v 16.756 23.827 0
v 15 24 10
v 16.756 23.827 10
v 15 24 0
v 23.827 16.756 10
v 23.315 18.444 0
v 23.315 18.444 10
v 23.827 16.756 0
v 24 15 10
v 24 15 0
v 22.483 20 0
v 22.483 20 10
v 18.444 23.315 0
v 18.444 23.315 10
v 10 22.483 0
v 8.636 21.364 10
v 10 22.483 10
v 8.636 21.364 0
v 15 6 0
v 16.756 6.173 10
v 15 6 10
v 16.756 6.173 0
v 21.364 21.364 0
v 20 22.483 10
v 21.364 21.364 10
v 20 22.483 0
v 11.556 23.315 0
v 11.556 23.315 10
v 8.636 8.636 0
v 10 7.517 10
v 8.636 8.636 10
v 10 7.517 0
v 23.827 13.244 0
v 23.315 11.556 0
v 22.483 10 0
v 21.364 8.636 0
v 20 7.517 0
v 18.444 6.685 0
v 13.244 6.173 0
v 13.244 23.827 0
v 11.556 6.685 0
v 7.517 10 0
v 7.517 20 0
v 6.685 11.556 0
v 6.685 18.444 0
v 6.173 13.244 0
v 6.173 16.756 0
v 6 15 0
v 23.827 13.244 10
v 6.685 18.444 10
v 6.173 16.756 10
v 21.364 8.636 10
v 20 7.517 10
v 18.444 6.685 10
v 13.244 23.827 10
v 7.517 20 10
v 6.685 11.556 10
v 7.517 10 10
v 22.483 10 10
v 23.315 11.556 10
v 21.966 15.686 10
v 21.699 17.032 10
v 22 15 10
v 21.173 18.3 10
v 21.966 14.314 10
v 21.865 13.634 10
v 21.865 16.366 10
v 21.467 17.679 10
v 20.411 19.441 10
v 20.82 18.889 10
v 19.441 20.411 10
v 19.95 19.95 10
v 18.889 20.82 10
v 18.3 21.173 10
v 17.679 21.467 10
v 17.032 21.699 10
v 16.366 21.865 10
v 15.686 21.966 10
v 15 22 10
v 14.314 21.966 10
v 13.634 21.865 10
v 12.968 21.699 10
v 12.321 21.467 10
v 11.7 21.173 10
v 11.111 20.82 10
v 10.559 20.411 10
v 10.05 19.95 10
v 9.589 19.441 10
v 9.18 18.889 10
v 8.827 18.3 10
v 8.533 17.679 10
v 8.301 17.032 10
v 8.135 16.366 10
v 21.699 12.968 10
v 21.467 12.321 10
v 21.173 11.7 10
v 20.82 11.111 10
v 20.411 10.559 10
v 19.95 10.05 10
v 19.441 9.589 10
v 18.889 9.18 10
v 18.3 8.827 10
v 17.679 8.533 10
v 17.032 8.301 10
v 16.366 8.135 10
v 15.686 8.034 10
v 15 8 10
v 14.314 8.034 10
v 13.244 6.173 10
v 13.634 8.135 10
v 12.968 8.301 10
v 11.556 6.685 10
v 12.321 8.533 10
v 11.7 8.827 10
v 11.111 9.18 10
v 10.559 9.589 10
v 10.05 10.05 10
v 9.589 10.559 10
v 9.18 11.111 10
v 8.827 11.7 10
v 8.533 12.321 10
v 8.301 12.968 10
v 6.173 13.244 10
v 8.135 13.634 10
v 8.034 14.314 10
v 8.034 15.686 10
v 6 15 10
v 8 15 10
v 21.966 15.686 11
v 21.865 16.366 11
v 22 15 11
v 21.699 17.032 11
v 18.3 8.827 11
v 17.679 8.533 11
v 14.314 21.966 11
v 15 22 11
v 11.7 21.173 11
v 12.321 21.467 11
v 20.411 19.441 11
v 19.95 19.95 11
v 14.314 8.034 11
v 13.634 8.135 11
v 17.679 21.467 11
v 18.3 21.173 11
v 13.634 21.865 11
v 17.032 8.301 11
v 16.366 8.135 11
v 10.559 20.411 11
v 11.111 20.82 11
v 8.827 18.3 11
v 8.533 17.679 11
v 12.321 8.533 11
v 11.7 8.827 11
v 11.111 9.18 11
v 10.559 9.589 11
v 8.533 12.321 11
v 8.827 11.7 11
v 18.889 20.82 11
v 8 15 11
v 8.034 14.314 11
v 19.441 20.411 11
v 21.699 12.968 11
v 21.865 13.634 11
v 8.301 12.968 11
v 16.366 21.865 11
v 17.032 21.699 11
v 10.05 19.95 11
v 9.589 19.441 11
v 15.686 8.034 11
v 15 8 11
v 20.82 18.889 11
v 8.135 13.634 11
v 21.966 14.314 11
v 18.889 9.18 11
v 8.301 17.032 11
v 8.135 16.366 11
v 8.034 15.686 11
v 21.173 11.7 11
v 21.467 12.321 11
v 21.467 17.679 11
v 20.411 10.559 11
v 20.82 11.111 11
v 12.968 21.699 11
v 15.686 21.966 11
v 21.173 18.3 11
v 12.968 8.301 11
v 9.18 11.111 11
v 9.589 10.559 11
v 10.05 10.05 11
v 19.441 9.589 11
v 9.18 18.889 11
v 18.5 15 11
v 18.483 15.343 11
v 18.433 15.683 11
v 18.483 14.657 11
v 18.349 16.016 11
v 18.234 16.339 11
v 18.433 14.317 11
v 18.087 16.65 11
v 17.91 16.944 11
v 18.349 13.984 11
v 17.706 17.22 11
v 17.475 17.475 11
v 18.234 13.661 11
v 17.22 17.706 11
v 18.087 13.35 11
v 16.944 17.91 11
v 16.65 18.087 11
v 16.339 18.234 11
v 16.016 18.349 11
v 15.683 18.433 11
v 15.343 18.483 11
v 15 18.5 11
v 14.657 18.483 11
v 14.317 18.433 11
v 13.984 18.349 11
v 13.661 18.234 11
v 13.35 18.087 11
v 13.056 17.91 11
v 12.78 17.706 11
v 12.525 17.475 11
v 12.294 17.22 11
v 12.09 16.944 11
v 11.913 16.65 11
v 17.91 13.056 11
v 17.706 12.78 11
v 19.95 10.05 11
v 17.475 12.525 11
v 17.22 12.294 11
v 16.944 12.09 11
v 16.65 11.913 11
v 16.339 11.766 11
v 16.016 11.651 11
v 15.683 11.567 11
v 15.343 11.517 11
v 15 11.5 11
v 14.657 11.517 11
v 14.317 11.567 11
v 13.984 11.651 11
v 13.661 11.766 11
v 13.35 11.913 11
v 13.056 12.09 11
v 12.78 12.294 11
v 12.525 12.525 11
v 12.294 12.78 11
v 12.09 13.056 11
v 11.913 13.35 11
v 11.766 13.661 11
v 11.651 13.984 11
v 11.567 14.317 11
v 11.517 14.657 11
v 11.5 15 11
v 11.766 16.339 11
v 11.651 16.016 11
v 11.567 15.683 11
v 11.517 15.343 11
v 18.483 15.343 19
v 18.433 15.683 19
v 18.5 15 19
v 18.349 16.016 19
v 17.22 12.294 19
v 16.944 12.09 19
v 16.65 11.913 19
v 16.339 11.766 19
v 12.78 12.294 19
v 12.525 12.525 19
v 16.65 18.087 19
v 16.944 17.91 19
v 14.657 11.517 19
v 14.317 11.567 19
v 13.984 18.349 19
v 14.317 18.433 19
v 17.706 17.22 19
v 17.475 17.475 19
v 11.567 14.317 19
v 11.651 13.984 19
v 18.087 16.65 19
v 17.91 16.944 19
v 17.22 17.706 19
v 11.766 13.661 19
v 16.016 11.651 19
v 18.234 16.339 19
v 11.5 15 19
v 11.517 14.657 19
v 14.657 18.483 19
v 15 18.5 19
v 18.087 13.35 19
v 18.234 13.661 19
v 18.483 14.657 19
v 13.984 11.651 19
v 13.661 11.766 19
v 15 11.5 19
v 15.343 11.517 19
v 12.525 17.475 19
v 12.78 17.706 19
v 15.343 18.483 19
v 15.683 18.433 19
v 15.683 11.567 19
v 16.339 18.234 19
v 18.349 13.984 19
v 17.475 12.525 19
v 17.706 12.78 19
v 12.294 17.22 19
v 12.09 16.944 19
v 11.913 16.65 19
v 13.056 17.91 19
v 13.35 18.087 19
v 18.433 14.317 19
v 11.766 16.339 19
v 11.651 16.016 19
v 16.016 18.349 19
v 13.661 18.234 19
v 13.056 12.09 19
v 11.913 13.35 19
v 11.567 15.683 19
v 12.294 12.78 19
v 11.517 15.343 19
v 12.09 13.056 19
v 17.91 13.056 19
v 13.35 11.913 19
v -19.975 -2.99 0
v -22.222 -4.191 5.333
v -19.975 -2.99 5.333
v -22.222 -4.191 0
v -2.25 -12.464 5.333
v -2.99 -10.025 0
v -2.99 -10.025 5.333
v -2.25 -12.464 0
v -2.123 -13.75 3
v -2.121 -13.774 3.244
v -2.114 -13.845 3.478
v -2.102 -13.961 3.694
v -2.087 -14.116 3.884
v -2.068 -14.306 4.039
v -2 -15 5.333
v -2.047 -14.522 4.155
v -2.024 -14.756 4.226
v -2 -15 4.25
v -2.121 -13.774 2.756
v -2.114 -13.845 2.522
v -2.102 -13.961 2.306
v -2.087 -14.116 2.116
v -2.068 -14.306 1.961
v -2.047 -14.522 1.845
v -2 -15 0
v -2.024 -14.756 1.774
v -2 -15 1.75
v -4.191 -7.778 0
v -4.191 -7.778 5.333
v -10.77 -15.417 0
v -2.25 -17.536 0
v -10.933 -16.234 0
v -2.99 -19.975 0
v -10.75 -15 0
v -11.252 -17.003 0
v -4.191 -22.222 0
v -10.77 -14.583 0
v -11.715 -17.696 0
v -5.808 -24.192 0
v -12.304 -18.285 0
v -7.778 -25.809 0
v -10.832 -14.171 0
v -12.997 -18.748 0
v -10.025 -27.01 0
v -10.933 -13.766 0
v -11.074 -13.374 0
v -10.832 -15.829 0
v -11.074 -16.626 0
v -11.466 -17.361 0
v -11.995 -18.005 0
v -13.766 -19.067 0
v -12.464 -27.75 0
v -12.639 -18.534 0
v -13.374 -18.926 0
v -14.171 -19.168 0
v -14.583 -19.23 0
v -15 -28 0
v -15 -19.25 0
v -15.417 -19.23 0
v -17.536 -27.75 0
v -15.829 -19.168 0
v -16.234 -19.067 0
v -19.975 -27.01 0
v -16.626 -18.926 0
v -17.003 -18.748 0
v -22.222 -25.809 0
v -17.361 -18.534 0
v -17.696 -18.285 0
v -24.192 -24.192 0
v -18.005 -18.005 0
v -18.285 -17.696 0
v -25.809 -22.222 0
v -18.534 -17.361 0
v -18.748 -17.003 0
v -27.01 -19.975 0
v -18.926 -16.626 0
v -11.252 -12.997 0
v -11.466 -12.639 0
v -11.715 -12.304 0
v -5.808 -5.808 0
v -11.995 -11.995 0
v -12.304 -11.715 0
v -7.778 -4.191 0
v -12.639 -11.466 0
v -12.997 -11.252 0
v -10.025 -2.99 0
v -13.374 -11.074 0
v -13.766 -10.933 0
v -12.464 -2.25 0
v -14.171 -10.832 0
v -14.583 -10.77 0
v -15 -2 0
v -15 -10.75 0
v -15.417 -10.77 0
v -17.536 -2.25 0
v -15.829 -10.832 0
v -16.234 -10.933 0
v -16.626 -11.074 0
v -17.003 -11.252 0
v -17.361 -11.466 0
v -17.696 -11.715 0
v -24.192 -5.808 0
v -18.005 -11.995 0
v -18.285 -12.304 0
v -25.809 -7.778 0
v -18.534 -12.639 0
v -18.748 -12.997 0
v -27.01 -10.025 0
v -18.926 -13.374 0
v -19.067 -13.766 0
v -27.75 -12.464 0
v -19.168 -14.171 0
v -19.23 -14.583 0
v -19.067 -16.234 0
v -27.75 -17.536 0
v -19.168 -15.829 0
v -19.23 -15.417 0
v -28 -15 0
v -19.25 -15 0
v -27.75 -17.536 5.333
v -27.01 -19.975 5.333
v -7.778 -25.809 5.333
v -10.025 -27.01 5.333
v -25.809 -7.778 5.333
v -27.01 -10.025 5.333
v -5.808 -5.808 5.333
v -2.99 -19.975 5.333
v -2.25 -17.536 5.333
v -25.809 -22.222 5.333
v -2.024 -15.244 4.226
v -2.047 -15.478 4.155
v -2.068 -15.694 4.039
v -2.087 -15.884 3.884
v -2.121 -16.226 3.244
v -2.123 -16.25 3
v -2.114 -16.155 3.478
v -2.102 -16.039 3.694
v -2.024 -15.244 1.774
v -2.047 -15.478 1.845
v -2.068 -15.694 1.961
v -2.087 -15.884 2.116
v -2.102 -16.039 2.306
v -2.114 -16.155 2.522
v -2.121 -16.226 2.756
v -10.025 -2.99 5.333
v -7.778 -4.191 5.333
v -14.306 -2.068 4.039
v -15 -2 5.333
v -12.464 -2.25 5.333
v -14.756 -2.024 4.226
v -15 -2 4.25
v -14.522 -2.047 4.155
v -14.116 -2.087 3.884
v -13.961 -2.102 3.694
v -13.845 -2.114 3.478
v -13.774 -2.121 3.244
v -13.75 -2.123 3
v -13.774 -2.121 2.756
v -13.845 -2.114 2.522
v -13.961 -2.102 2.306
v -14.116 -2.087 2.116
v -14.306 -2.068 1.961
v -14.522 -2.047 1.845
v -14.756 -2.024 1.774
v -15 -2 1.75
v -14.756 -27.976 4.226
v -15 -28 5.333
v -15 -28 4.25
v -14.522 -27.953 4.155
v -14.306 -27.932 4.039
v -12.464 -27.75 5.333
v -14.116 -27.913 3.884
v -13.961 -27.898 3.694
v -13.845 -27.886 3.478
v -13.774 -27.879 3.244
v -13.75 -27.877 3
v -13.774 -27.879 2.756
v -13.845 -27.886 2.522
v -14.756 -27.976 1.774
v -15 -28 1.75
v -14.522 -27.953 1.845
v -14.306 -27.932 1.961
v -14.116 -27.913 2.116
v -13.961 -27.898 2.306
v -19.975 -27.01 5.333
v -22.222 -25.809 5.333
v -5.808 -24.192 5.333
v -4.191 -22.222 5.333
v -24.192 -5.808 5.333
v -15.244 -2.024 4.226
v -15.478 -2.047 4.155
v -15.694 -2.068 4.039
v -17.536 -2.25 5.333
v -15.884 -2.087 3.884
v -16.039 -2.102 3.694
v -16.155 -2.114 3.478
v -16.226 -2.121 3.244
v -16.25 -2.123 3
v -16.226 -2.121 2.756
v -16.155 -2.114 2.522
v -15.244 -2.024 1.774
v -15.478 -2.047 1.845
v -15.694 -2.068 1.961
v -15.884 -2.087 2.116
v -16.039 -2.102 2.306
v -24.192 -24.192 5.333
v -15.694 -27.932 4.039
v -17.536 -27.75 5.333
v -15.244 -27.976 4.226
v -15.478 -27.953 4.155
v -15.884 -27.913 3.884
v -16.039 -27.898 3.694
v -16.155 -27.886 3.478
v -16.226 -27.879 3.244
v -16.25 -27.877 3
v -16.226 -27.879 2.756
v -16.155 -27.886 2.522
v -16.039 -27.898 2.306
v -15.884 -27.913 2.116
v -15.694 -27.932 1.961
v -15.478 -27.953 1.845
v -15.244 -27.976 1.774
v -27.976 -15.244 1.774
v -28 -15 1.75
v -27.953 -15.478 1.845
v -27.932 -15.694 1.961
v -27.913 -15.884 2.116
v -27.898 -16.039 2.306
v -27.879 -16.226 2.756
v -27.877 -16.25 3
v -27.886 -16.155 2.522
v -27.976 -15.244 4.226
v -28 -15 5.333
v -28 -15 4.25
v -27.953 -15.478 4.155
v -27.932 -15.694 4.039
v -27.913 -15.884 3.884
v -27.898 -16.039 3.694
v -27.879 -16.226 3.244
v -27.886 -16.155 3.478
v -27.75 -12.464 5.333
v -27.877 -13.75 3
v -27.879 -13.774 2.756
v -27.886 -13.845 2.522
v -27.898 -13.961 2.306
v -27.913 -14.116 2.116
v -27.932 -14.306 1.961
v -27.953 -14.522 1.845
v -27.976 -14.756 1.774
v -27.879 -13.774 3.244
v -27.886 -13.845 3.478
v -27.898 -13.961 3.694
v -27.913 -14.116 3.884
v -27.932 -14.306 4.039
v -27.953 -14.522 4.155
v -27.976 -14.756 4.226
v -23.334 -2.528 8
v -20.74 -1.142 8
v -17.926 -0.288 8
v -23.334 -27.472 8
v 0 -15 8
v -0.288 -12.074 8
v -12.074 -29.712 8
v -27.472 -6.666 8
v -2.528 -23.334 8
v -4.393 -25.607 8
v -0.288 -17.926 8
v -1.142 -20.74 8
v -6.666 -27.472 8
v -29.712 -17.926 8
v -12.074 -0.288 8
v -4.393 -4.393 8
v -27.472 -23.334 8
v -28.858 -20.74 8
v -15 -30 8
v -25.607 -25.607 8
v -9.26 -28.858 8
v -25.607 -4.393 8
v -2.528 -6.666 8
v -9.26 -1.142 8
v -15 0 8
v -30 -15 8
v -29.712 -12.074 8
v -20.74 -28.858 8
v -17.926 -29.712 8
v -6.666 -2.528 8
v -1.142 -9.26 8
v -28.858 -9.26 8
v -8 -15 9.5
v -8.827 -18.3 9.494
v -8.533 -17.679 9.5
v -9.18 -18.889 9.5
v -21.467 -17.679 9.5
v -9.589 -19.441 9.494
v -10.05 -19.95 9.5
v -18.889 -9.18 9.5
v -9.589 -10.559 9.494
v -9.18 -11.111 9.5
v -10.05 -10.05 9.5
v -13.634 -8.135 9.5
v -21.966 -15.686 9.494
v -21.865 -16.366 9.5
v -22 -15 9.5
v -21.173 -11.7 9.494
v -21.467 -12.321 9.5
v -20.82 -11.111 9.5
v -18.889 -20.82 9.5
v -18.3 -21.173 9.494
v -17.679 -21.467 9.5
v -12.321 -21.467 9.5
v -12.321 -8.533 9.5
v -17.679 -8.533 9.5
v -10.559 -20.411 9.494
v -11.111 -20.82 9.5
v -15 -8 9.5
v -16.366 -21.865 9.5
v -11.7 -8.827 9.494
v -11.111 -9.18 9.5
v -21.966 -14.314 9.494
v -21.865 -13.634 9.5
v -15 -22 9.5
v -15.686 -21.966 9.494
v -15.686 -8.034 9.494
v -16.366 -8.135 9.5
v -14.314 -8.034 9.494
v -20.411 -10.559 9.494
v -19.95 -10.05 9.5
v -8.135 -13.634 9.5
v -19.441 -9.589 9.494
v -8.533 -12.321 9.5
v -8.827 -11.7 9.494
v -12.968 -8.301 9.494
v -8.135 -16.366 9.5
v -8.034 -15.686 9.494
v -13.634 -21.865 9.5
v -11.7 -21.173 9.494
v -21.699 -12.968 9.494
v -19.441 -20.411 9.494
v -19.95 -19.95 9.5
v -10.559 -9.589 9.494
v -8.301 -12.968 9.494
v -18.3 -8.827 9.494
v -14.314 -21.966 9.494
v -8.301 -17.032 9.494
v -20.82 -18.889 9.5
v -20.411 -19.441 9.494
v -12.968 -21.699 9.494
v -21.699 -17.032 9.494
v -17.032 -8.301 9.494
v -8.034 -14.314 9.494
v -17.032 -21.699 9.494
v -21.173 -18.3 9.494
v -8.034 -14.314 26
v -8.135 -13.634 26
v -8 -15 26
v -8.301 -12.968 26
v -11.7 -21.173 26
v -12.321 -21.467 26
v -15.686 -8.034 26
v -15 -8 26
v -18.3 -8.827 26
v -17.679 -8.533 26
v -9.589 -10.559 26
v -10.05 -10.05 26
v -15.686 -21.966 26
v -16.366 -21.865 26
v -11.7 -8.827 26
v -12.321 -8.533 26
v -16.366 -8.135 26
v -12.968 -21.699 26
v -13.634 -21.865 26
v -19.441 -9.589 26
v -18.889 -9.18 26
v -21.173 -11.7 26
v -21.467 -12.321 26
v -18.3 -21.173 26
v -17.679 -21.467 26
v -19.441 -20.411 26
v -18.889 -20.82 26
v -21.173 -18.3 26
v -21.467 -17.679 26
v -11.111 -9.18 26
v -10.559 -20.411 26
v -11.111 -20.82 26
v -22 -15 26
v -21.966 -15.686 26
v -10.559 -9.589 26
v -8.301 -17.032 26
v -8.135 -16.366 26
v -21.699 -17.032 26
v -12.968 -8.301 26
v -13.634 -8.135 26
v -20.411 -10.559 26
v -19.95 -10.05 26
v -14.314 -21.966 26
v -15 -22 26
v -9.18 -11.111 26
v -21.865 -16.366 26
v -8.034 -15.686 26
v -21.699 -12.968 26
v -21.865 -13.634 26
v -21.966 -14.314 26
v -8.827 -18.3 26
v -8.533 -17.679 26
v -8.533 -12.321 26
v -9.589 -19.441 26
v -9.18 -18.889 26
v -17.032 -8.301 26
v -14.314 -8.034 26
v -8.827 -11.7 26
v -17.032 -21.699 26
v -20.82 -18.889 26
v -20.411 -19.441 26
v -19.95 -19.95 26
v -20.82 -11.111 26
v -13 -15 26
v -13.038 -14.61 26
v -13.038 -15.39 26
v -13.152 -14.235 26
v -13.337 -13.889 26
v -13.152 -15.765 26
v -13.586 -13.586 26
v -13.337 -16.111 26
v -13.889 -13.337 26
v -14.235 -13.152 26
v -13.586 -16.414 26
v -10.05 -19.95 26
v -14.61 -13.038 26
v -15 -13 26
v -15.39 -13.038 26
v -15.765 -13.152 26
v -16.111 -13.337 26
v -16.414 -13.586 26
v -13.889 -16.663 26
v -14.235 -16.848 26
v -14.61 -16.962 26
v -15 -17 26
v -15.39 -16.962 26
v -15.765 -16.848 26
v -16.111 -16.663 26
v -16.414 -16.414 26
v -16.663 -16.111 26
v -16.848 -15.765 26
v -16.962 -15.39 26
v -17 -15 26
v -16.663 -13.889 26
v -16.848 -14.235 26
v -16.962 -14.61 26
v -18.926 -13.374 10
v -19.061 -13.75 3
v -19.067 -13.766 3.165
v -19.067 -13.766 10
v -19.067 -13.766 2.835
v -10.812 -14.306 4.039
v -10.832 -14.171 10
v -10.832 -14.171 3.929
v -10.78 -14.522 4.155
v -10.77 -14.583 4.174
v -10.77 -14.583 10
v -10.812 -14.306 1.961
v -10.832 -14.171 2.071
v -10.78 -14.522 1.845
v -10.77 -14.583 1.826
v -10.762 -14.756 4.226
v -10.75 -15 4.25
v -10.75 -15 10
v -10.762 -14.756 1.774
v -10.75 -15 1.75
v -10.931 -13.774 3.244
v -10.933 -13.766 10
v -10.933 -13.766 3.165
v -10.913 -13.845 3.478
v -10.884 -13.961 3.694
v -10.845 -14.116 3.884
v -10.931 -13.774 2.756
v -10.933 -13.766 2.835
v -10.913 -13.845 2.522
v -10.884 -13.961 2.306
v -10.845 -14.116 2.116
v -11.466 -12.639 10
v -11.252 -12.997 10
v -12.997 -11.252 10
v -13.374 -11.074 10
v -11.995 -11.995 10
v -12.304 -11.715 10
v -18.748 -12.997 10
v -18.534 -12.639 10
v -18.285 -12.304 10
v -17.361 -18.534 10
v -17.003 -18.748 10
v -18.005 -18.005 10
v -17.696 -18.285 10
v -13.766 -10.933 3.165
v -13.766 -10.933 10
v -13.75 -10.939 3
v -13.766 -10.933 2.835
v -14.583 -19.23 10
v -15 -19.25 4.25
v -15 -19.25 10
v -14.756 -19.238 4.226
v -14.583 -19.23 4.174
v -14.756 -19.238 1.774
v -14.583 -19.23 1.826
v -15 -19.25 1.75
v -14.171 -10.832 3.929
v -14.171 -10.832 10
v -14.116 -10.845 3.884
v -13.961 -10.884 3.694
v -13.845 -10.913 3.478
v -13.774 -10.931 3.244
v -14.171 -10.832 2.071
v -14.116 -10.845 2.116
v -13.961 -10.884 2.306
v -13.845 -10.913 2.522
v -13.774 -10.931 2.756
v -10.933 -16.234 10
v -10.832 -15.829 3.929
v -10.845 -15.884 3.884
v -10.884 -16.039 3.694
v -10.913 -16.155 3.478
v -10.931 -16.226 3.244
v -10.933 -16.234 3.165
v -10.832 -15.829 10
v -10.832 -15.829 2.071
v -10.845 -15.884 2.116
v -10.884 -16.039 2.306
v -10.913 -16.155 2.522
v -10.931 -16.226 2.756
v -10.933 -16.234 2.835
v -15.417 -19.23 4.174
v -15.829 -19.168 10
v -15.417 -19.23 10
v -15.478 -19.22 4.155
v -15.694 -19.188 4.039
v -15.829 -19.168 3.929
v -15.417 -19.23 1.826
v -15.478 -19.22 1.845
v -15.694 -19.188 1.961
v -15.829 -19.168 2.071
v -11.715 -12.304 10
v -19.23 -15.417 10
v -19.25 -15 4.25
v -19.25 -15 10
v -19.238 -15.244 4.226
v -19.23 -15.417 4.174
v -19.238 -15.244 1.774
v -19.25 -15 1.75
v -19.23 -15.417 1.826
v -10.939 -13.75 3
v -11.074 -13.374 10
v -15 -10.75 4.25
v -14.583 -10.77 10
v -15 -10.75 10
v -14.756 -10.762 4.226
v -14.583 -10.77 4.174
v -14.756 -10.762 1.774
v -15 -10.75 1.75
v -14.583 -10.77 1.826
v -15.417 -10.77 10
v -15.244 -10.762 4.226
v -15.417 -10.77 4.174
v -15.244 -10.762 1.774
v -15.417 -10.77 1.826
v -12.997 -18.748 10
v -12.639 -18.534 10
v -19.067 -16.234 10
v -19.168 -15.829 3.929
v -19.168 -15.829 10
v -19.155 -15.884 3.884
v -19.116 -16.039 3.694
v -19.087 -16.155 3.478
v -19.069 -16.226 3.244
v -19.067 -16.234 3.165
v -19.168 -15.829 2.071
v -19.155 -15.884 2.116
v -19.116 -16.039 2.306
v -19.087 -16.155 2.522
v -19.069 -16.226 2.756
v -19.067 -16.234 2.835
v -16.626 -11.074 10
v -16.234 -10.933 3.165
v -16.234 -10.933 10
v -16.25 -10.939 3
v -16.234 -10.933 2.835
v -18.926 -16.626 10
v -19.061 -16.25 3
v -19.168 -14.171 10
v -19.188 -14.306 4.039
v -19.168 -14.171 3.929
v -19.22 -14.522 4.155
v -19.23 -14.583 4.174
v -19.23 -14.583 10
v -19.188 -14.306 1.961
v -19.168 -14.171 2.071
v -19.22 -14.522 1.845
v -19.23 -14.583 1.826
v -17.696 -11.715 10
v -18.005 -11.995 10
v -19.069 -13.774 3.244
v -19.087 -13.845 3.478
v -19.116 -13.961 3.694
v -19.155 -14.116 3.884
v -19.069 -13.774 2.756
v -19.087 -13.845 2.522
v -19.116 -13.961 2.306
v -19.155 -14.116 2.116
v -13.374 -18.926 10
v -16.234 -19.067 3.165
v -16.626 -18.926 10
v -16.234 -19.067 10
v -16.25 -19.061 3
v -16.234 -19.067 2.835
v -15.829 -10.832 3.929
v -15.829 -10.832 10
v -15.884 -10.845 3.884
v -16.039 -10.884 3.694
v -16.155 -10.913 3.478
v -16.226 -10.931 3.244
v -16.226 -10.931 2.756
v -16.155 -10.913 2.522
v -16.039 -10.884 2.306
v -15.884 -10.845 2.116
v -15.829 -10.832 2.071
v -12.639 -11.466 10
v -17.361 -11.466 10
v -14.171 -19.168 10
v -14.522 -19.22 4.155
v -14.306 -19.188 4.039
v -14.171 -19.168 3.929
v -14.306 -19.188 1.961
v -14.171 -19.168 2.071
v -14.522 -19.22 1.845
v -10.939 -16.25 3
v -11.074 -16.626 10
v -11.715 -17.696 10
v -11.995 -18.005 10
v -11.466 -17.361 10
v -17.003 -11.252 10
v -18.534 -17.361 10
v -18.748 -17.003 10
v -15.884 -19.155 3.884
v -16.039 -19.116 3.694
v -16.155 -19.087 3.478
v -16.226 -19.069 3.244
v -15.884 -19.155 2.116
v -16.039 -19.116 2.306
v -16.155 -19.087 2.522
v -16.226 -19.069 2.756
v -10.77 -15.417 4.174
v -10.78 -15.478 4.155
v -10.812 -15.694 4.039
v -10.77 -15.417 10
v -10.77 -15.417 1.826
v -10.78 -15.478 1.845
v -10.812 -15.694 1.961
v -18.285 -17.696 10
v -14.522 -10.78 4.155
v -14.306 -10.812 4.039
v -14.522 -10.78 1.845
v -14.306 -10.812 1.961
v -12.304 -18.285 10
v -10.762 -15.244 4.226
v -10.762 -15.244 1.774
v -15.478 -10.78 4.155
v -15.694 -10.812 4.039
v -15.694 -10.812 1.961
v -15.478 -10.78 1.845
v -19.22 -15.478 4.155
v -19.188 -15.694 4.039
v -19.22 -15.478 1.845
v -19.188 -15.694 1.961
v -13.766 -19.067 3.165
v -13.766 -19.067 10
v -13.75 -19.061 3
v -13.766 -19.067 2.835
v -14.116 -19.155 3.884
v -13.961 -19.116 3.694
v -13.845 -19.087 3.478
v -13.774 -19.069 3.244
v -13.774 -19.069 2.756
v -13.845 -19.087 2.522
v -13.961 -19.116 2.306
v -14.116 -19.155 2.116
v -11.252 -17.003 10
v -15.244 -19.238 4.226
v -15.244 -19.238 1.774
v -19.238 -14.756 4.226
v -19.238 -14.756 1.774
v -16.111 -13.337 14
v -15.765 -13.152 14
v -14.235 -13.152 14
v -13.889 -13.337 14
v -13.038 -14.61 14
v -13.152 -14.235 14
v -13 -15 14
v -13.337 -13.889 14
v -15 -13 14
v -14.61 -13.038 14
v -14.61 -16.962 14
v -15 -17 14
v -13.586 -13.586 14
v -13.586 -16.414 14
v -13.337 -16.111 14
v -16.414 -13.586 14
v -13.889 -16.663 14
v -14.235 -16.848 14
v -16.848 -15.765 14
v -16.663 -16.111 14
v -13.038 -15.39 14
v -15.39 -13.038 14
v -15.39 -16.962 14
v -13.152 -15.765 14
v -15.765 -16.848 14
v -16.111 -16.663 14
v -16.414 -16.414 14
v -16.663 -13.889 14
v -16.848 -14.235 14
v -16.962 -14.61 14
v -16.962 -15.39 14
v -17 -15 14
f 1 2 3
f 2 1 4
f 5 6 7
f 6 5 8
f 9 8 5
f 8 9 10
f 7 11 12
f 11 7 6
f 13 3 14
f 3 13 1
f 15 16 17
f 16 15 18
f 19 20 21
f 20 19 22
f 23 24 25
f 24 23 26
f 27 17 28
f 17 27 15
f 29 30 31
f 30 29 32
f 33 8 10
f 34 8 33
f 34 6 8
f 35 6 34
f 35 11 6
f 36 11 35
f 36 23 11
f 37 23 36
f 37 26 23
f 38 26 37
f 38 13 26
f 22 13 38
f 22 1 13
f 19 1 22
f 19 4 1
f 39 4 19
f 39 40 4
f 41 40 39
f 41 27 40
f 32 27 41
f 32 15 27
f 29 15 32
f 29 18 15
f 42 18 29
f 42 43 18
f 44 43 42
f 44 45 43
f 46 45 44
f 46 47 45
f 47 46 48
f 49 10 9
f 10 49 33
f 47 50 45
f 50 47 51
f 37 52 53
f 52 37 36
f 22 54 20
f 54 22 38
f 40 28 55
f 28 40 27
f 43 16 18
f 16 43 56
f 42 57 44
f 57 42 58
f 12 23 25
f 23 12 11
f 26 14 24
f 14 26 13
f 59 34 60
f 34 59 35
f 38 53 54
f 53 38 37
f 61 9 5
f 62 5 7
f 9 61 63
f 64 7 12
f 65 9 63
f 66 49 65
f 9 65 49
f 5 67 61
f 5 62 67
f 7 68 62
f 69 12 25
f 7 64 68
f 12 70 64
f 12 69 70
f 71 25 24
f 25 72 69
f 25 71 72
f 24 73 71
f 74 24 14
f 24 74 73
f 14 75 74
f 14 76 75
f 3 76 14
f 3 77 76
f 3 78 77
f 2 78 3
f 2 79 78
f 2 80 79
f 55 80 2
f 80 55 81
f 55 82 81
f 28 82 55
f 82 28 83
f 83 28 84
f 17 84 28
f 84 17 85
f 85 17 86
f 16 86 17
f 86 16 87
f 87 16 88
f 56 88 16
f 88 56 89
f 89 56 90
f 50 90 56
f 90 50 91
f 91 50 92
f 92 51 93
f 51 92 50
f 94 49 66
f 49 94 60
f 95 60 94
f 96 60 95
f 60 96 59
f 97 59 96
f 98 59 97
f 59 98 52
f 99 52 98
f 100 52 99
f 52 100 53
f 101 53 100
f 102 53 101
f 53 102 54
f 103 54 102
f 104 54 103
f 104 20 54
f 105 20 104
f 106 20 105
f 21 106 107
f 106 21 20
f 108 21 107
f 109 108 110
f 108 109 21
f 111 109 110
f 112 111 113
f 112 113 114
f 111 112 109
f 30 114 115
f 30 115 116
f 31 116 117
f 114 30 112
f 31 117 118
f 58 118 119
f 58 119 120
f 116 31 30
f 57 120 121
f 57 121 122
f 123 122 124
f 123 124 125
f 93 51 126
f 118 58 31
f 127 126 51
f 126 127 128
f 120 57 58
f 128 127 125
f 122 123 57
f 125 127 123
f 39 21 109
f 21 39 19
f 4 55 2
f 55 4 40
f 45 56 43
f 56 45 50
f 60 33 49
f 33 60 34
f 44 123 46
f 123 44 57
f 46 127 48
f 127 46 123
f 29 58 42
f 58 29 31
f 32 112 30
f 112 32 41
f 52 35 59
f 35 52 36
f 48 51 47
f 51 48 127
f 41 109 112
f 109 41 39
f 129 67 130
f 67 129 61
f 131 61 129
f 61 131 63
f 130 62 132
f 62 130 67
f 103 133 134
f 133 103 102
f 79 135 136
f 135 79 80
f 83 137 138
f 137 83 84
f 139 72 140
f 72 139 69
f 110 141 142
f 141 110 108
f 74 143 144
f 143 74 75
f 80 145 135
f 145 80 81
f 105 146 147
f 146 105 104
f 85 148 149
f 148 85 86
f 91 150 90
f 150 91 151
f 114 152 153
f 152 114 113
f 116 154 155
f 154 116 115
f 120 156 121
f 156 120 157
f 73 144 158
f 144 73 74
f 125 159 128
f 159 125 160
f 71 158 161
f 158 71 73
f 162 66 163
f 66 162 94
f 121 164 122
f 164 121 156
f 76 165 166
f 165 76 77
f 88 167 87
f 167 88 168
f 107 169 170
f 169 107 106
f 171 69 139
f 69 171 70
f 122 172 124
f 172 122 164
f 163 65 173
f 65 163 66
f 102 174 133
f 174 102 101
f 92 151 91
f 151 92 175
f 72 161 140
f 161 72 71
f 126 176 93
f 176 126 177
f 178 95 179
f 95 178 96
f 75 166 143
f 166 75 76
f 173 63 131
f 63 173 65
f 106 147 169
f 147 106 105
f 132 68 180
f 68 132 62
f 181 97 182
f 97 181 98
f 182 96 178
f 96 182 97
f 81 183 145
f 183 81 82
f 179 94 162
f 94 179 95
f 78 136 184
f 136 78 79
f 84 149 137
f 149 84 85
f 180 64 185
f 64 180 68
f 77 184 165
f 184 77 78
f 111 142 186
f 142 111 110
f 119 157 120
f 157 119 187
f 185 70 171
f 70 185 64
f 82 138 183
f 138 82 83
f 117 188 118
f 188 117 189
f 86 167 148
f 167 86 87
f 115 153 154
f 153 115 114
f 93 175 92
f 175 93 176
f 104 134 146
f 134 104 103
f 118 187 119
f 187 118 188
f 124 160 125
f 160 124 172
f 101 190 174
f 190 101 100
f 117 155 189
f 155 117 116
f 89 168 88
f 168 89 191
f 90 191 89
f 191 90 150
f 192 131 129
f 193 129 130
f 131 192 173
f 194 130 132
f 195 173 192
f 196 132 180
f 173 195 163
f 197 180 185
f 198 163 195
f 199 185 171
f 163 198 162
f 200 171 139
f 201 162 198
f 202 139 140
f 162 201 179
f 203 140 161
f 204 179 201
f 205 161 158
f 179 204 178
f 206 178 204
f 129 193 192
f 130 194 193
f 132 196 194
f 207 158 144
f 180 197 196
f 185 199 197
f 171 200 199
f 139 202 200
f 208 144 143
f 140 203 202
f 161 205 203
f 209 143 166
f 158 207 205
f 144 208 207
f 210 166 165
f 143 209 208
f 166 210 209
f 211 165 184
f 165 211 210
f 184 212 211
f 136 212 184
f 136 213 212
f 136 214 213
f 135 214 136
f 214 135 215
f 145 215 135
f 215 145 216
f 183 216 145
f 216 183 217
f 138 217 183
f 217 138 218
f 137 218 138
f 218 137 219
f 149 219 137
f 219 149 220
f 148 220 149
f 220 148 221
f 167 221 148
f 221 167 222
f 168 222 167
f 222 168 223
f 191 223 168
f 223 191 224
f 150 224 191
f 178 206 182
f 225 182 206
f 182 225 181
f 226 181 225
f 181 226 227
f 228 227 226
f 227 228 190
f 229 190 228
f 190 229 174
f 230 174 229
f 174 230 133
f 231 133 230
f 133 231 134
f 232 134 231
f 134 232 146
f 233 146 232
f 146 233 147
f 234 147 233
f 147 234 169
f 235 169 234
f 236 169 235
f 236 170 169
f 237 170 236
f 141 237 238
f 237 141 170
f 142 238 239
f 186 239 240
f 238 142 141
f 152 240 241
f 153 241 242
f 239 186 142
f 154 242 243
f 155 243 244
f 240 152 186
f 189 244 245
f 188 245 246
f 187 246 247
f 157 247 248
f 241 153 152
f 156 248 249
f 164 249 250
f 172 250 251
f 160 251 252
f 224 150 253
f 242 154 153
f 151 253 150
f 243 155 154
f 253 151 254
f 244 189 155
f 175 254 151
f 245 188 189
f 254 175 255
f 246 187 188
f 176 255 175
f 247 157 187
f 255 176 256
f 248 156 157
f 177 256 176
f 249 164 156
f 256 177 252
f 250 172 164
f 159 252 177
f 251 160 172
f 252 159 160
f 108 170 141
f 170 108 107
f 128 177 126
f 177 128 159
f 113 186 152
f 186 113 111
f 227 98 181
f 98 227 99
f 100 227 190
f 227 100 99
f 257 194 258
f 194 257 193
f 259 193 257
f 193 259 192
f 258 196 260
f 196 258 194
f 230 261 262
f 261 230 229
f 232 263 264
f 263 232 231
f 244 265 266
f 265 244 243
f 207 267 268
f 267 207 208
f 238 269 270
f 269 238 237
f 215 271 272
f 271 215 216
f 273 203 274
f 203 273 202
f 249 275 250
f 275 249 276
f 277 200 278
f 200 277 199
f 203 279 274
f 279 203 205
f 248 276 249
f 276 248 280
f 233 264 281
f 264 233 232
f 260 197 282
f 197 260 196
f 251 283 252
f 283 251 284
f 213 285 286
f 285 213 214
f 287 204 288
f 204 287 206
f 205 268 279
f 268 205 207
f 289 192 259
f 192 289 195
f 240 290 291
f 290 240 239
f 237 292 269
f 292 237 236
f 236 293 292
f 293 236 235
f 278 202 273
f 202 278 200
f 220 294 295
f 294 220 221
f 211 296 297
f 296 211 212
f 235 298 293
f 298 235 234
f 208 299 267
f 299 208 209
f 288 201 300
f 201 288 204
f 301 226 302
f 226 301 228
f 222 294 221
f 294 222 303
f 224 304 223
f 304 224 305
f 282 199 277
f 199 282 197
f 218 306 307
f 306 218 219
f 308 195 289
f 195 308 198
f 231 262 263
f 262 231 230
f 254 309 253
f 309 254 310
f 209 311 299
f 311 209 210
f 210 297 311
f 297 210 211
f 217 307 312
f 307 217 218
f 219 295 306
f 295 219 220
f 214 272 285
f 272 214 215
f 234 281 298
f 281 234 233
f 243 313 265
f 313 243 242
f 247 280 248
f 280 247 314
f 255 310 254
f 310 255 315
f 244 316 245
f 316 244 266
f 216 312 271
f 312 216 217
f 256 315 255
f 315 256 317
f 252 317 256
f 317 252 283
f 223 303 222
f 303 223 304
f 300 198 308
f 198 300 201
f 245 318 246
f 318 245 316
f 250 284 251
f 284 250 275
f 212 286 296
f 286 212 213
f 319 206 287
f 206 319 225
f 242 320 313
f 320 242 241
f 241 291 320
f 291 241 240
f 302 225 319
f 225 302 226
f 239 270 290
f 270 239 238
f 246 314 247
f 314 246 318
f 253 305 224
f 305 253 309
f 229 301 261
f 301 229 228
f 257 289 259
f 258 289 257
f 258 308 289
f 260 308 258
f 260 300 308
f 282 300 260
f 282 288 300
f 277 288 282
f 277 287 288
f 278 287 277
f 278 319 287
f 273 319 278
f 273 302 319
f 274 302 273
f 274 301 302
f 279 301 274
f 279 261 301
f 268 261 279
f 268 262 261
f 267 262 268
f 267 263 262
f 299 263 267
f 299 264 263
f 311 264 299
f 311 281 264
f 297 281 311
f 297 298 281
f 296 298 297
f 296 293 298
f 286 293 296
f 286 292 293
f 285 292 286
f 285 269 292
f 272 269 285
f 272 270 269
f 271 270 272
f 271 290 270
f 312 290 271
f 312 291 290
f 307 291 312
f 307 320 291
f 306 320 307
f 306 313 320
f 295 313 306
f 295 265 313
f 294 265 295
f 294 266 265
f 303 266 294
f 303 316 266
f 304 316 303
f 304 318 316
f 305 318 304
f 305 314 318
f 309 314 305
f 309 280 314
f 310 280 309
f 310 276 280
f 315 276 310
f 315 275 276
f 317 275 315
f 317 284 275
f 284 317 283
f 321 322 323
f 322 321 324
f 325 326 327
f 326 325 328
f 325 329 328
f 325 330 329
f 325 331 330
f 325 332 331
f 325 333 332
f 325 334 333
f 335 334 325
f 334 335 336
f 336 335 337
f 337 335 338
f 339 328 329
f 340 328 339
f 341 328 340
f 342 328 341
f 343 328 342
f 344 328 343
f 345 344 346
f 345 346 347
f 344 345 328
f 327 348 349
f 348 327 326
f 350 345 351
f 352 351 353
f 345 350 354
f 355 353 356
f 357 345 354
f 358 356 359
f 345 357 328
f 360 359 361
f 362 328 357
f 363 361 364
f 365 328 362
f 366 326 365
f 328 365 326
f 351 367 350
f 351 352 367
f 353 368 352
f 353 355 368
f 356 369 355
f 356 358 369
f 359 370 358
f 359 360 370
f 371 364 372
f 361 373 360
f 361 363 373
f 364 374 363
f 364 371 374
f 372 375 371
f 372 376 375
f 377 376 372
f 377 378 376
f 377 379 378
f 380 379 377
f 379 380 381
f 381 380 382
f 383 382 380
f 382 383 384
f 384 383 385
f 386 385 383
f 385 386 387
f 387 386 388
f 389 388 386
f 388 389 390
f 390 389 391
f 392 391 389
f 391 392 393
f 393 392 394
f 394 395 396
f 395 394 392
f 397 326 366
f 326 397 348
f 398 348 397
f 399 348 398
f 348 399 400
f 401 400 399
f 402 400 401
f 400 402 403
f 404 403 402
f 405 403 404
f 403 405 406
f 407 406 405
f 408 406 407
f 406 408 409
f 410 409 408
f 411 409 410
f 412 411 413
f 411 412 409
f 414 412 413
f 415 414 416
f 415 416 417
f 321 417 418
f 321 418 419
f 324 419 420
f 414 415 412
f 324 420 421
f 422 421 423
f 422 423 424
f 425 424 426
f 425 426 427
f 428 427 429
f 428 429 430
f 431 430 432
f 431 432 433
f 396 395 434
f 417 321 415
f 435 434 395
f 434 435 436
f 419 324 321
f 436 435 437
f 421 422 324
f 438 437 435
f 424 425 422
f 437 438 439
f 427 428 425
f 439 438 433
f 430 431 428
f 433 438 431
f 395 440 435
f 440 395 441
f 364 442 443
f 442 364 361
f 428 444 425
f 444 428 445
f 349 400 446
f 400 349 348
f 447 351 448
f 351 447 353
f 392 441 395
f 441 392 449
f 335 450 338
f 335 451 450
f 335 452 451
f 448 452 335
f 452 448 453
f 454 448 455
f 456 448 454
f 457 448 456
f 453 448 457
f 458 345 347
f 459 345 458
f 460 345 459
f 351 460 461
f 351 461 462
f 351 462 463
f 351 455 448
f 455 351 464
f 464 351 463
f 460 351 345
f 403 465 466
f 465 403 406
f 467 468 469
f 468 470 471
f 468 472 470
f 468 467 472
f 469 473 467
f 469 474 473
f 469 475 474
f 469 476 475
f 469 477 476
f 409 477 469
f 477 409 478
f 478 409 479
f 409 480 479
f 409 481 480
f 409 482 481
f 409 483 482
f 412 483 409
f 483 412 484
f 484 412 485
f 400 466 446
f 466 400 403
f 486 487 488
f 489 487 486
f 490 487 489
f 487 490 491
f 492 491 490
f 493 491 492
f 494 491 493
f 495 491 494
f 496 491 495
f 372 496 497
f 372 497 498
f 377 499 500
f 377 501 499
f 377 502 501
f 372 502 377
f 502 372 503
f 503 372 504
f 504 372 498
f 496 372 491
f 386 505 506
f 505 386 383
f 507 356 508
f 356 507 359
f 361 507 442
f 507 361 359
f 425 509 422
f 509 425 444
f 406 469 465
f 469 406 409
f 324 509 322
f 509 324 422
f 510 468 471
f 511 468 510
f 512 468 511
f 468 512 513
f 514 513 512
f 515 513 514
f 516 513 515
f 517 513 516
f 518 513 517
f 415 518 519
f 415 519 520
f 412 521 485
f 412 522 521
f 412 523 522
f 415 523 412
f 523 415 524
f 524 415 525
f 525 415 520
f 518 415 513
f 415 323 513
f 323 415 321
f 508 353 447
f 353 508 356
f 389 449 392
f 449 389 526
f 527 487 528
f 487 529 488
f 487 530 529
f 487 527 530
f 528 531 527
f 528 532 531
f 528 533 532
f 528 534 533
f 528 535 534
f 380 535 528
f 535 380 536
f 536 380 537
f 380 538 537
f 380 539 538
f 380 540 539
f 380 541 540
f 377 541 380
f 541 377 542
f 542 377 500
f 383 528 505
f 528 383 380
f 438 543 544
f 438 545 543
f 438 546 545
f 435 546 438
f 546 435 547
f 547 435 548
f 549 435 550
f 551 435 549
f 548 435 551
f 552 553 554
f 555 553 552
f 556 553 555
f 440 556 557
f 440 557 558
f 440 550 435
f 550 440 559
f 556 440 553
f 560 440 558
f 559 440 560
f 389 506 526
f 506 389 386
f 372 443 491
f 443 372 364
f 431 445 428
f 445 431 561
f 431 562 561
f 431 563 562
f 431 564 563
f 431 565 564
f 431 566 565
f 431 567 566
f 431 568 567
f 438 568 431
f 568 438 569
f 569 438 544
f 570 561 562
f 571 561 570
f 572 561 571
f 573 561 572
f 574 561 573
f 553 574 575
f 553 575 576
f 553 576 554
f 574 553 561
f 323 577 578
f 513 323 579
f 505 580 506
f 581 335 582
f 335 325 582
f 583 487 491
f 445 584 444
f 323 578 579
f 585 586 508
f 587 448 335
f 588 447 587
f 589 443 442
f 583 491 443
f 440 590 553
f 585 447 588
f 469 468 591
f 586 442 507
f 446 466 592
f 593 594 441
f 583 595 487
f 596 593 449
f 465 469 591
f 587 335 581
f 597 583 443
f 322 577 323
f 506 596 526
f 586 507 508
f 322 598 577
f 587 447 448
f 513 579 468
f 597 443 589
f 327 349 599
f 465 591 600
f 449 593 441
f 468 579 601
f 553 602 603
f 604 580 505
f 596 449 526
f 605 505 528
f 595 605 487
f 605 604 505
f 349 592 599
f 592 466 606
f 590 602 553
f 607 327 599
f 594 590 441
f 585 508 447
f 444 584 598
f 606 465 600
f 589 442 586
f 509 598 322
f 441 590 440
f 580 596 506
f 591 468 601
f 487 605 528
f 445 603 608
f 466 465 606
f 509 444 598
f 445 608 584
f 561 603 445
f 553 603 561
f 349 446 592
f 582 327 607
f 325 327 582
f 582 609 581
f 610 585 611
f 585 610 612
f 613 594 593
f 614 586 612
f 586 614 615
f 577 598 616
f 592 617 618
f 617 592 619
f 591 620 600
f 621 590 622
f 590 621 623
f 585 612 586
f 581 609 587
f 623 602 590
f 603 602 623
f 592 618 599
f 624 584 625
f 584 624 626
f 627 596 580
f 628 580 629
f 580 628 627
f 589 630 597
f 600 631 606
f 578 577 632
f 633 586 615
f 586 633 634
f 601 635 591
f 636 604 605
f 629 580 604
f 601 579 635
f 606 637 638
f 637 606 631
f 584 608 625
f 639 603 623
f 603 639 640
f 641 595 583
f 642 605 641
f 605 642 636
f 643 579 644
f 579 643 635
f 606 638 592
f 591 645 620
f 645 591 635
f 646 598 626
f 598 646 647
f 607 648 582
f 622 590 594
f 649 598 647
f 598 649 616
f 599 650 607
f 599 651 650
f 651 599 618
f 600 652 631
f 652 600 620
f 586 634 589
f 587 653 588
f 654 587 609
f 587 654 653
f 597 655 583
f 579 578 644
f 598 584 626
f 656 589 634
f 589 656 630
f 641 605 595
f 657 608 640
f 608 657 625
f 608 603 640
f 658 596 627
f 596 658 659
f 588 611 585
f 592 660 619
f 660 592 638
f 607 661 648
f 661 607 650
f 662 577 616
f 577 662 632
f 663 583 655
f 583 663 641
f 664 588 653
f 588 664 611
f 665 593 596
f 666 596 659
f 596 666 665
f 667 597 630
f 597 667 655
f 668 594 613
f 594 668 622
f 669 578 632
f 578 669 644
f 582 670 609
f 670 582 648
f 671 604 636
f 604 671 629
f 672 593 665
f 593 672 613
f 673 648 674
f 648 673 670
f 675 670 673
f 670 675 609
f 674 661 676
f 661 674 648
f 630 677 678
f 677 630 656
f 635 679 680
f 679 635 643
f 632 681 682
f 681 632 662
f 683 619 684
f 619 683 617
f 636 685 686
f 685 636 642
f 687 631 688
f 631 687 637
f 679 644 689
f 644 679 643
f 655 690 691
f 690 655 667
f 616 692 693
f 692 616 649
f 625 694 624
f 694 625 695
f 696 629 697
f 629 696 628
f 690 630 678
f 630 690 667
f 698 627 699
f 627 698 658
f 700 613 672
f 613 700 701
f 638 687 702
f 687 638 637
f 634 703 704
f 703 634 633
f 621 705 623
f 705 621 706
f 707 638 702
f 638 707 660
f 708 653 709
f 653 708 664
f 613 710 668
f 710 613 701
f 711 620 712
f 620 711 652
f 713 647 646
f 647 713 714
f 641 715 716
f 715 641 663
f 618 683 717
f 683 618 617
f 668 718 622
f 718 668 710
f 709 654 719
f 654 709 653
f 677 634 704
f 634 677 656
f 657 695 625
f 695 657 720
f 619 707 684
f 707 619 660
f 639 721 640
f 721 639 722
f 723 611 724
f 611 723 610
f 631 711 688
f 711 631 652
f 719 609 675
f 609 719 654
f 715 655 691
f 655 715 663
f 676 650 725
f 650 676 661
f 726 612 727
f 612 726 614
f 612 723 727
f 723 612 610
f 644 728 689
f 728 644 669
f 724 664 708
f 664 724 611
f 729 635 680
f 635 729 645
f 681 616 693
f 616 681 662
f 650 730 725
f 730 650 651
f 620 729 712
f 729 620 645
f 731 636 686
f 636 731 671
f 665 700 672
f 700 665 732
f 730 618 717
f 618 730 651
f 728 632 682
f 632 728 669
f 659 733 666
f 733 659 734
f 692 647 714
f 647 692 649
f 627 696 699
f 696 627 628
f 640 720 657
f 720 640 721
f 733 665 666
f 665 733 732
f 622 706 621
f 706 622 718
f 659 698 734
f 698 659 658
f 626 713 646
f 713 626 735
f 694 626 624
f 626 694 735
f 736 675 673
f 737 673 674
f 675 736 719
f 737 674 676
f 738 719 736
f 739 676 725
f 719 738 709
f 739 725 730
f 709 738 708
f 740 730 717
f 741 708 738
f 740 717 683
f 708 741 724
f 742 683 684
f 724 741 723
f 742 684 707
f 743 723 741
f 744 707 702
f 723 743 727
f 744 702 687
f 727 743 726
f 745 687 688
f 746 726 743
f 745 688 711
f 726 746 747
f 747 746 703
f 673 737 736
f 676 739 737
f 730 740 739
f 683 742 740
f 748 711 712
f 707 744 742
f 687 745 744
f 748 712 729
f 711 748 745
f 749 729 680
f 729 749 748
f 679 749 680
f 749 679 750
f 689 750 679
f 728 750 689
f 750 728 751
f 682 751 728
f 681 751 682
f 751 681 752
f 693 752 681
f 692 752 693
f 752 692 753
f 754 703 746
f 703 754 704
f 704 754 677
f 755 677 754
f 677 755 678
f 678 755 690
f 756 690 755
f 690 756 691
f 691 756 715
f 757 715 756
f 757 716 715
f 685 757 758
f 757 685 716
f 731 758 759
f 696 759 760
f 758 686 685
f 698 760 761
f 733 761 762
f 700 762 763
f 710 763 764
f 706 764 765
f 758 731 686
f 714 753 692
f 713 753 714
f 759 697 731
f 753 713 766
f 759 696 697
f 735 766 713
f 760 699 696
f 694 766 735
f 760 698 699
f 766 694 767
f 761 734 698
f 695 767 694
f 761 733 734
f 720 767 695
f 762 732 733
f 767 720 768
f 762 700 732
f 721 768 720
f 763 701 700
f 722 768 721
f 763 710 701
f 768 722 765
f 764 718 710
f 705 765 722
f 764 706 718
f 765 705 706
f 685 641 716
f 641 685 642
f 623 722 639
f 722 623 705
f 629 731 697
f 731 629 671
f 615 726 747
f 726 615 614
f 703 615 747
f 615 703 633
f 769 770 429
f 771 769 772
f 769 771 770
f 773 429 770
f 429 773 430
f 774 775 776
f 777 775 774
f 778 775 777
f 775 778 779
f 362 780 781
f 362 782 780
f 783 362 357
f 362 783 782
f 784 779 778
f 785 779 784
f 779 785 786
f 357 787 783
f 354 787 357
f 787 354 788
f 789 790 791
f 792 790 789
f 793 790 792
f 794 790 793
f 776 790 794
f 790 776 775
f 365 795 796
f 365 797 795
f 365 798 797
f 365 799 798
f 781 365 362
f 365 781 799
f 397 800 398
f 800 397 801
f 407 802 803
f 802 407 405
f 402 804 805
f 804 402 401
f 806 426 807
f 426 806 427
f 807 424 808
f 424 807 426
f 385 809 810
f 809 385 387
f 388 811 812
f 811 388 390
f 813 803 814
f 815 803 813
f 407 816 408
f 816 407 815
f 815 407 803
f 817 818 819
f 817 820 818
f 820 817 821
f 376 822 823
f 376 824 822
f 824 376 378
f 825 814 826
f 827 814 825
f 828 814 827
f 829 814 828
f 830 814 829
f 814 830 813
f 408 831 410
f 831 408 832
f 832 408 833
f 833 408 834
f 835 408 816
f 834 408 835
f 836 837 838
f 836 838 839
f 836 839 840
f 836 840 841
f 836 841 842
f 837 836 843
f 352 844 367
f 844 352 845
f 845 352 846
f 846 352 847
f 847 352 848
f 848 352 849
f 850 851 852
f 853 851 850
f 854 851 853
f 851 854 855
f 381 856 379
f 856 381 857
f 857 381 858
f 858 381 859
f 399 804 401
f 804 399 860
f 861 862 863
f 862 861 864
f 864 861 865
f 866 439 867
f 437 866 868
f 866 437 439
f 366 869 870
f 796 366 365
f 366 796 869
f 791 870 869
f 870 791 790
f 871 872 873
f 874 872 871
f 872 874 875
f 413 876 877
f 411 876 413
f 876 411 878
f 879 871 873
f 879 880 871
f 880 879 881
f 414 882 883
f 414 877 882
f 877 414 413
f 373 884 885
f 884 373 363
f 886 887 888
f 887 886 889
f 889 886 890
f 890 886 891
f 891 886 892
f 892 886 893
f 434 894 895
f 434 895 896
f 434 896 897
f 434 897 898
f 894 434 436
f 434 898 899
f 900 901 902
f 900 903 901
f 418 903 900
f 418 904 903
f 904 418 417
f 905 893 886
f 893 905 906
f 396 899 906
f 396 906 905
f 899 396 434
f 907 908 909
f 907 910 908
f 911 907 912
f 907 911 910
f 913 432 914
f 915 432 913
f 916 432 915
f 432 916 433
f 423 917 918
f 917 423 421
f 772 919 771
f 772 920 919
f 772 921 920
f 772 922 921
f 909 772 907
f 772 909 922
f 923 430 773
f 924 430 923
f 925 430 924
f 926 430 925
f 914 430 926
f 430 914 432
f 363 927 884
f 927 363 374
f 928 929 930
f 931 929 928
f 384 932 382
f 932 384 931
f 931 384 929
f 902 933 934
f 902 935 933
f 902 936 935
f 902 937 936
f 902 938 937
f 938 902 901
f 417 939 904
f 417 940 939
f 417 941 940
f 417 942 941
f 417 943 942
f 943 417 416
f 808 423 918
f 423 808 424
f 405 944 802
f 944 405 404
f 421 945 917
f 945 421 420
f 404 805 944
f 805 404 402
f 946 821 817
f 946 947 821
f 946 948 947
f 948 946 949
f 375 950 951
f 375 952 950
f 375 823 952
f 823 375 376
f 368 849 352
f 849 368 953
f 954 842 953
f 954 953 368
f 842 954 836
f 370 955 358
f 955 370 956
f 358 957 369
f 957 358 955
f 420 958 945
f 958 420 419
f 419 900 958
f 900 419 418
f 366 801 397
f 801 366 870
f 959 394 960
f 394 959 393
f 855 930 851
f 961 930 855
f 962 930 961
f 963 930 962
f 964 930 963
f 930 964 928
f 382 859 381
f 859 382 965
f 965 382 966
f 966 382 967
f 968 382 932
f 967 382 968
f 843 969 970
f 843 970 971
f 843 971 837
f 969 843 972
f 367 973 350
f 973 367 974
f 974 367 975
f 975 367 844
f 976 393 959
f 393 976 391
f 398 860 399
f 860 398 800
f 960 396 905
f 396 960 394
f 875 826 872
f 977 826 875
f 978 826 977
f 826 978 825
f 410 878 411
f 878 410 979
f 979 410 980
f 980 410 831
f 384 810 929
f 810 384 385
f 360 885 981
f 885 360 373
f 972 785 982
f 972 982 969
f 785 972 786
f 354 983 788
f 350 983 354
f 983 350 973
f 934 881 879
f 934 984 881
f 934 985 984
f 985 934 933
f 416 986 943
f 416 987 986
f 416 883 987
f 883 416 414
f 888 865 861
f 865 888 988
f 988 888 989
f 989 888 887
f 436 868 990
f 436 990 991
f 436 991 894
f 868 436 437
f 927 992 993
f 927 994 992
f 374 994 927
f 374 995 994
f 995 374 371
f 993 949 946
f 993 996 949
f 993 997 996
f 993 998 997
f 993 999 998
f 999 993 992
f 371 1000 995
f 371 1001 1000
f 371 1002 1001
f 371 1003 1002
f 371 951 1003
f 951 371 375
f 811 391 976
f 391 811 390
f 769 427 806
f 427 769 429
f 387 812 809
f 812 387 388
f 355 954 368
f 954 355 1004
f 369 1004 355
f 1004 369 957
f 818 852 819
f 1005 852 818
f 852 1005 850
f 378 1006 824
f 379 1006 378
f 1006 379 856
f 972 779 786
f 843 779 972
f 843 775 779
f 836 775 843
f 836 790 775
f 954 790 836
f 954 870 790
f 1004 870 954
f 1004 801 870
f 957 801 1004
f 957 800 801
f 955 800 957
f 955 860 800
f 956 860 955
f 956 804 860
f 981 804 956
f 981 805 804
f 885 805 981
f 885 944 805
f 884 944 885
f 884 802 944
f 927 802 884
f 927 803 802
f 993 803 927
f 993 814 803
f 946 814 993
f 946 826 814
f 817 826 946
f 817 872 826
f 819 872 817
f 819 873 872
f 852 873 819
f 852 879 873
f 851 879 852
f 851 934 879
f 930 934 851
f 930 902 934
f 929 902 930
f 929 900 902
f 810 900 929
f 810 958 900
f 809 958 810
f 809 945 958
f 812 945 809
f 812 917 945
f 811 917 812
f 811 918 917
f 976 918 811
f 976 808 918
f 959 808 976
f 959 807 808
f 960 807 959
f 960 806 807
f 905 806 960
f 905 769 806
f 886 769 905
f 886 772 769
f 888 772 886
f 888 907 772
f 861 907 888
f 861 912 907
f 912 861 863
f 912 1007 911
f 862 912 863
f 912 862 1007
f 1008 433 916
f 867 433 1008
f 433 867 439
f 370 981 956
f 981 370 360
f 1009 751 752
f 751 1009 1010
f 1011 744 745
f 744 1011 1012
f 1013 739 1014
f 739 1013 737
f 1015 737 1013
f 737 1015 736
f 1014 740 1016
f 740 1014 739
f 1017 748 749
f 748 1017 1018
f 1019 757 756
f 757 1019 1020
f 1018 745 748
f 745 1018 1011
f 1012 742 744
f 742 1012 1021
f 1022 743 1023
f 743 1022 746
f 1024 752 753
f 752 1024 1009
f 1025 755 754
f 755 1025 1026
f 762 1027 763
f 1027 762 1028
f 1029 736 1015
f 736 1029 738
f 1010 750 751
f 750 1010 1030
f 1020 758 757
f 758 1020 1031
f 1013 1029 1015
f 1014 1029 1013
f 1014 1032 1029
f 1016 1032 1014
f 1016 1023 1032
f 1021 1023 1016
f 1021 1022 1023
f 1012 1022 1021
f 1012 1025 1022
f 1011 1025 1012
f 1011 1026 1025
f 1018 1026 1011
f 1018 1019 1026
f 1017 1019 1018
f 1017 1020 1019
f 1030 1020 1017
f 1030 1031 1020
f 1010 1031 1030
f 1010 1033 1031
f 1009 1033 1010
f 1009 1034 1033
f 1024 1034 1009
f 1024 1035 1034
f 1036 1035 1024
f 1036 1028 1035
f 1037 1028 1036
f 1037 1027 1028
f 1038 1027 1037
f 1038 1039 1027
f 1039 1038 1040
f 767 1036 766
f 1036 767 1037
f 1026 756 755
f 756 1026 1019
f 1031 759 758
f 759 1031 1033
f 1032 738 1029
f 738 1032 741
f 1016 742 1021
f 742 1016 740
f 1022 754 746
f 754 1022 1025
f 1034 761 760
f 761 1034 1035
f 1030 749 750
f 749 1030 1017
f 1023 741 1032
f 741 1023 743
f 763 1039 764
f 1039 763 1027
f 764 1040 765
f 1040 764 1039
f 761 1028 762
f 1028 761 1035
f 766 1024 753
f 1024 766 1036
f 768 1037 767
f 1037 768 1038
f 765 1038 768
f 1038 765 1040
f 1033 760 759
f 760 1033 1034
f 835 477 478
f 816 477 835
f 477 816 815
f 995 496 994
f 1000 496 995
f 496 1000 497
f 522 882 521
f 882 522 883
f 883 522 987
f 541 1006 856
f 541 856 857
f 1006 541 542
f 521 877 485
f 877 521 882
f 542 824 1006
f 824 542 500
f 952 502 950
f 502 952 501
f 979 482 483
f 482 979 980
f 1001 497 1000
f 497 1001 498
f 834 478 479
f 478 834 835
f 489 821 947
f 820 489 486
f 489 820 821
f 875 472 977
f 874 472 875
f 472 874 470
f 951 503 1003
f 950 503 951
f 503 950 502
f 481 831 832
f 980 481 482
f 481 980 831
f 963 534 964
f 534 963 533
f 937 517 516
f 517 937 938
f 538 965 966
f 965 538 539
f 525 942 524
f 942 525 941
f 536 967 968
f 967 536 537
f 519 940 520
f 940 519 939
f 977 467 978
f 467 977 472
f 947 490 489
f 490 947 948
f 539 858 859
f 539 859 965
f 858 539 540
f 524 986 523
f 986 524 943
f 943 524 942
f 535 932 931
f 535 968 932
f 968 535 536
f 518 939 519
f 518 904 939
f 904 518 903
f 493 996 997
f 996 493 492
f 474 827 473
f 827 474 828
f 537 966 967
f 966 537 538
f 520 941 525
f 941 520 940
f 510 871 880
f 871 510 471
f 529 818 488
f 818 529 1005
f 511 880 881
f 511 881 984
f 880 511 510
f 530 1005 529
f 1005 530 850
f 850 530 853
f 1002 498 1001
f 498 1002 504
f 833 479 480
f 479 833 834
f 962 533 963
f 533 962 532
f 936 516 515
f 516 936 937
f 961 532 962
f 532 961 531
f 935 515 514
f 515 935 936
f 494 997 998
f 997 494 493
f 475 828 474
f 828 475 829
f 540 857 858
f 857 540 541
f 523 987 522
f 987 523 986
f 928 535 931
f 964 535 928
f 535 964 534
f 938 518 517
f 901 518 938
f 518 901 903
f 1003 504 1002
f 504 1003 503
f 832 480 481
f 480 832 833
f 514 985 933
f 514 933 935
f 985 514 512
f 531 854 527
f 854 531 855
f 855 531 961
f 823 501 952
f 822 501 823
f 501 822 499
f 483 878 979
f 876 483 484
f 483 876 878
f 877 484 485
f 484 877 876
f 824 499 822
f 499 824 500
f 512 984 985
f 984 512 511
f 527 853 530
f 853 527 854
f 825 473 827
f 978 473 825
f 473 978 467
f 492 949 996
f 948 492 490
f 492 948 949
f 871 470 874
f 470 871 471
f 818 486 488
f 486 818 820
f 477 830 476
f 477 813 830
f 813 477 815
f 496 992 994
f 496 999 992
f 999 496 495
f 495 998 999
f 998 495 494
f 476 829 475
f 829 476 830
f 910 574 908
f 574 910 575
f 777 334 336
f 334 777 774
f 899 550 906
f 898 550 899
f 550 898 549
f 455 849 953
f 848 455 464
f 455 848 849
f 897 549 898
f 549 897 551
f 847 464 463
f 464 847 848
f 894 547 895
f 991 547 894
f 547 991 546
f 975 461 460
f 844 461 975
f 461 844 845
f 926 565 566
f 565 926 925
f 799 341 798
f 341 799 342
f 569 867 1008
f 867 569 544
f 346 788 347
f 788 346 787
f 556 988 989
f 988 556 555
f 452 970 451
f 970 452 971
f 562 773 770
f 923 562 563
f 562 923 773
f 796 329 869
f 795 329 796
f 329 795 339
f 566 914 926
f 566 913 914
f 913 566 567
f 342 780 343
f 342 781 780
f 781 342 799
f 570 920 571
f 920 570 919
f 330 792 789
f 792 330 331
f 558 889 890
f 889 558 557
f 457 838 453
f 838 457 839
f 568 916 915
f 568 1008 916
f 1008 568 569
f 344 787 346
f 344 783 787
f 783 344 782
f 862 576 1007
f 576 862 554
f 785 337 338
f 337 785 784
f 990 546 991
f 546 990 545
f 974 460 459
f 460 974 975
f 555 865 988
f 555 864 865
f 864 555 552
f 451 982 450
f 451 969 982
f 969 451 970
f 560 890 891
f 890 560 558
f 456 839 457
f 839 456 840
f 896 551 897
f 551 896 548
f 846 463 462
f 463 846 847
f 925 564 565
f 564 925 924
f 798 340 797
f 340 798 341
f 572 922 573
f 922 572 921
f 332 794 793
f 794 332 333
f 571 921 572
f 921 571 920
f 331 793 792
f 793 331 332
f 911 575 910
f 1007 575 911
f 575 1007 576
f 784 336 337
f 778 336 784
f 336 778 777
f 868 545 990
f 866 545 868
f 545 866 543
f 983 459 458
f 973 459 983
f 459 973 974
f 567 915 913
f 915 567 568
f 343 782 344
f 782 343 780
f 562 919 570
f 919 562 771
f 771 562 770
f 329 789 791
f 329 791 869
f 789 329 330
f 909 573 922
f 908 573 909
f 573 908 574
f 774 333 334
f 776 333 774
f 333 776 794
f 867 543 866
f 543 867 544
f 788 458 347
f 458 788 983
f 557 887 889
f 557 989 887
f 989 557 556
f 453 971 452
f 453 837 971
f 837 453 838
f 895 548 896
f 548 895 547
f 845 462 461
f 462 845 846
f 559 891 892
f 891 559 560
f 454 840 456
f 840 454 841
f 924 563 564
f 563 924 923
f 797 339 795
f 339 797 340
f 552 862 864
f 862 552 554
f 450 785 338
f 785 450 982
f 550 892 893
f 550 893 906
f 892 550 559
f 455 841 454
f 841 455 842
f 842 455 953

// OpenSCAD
// OpenSCAD file for the 3d printed parts
$fn=32;

cd_thickness = 1;
cd_hole_radius = 7;
adapter_base_height = 10;
adapter_base_radius = 9;

top_peg_radius = 7/2;
top_peg_height = 8;

pulley_hole_radius = 8.5/2;
pulley_hole_depth = 10;
pulley_inner_height = 12;
pulley_outer_height = 18;
pulley_inner_radius = 7;
pulley_outer_radius = 15;
pulley_base_radius = pulley_outer_radius -2;
pulley_base_height = 8;
pulley_top_height = 4;
pulley_top_screw_radius = 2;
pulley_side_screw_radius = 1.5;

pulley_flange_height =  (pulley_outer_height-pulley_inner_height)/4;


// First set of modules make the 2 parts of the pulley 
module drive_pulley()
{
    difference(){
        union(){
            drive_pulley_base();
            translate([0,0,pulley_base_height]){
            drive_pulley_flange();
            // this is the central column of pulley
            cylinder($fn=64, h = pulley_outer_height, r = pulley_inner_radius, center = false);
            }
        }
        bottom_hole();
        top_hole();
        screw_holes(6,90);
        screw_holes(6,0);
    }
}

module drive_pulley_base()
{
    union(){
            cylinder(h = pulley_base_height/3*2, r = pulley_base_radius, center = false);
            translate([0,0,pulley_base_height/3*2]) cylinder(h = pulley_base_height/3, r1 = pulley_base_radius, r2=pulley_outer_radius, center = false);

    }
}

module drive_pulley_flange()
{
            cylinder(h = pulley_flange_height, r1=pulley_outer_radius, r2 = pulley_inner_radius, center=false);
}

module drive_pulley_flange_top()
{
    difference(){
        union(){
            cylinder(h = pulley_top_height, r=pulley_outer_radius);
            translate([0,0,pulley_top_height])
            drive_pulley_flange();
        }
        
        cylinder(h=20,r=pulley_top_screw_radius,center=true);
    }
}

module top_hole(){
        translate([0,0,pulley_outer_height+5])
        cylinder(h=18,r=pulley_top_screw_radius,center=true);
}

module bottom_hole()
{
 translate([0,0,-1]) cylinder(h = pulley_hole_depth+1, r = pulley_hole_radius, center = false, $fn=64);
}

module screw_holes(height,angle){
    translate([0,0,height/2]) rotate([0,90,angle])  cylinder(h = 30, r = 1.25, center = true);
}


// modules from here make the CD adapter for the top
module cd_adapter()
{
    union(){
        adapter_base();
        translate([0,0,adapter_base_height]) cd_fitting();
        translate([0,0,adapter_base_height+cd_thickness])top_peg();
    }
}

module adapter_base()
{
    cylinder(h = adapter_base_height, r = adapter_base_radius, center = false);
}

module cd_fitting()
{
 cylinder(h = cd_thickness, r = cd_hole_radius, center = false, $fn=64);
}

module top_peg()
{
 cylinder(h = top_peg_height, r = top_peg_radius, center = false, $fn=64);
}


translate([15,15,0])cd_adapter();
translate([-15,-15,0]) drive_pulley();
// Didn't need a top for the pulleyin the end - but this is it below
//translate([20,-20,0]) drive_pulley_flange_top();
